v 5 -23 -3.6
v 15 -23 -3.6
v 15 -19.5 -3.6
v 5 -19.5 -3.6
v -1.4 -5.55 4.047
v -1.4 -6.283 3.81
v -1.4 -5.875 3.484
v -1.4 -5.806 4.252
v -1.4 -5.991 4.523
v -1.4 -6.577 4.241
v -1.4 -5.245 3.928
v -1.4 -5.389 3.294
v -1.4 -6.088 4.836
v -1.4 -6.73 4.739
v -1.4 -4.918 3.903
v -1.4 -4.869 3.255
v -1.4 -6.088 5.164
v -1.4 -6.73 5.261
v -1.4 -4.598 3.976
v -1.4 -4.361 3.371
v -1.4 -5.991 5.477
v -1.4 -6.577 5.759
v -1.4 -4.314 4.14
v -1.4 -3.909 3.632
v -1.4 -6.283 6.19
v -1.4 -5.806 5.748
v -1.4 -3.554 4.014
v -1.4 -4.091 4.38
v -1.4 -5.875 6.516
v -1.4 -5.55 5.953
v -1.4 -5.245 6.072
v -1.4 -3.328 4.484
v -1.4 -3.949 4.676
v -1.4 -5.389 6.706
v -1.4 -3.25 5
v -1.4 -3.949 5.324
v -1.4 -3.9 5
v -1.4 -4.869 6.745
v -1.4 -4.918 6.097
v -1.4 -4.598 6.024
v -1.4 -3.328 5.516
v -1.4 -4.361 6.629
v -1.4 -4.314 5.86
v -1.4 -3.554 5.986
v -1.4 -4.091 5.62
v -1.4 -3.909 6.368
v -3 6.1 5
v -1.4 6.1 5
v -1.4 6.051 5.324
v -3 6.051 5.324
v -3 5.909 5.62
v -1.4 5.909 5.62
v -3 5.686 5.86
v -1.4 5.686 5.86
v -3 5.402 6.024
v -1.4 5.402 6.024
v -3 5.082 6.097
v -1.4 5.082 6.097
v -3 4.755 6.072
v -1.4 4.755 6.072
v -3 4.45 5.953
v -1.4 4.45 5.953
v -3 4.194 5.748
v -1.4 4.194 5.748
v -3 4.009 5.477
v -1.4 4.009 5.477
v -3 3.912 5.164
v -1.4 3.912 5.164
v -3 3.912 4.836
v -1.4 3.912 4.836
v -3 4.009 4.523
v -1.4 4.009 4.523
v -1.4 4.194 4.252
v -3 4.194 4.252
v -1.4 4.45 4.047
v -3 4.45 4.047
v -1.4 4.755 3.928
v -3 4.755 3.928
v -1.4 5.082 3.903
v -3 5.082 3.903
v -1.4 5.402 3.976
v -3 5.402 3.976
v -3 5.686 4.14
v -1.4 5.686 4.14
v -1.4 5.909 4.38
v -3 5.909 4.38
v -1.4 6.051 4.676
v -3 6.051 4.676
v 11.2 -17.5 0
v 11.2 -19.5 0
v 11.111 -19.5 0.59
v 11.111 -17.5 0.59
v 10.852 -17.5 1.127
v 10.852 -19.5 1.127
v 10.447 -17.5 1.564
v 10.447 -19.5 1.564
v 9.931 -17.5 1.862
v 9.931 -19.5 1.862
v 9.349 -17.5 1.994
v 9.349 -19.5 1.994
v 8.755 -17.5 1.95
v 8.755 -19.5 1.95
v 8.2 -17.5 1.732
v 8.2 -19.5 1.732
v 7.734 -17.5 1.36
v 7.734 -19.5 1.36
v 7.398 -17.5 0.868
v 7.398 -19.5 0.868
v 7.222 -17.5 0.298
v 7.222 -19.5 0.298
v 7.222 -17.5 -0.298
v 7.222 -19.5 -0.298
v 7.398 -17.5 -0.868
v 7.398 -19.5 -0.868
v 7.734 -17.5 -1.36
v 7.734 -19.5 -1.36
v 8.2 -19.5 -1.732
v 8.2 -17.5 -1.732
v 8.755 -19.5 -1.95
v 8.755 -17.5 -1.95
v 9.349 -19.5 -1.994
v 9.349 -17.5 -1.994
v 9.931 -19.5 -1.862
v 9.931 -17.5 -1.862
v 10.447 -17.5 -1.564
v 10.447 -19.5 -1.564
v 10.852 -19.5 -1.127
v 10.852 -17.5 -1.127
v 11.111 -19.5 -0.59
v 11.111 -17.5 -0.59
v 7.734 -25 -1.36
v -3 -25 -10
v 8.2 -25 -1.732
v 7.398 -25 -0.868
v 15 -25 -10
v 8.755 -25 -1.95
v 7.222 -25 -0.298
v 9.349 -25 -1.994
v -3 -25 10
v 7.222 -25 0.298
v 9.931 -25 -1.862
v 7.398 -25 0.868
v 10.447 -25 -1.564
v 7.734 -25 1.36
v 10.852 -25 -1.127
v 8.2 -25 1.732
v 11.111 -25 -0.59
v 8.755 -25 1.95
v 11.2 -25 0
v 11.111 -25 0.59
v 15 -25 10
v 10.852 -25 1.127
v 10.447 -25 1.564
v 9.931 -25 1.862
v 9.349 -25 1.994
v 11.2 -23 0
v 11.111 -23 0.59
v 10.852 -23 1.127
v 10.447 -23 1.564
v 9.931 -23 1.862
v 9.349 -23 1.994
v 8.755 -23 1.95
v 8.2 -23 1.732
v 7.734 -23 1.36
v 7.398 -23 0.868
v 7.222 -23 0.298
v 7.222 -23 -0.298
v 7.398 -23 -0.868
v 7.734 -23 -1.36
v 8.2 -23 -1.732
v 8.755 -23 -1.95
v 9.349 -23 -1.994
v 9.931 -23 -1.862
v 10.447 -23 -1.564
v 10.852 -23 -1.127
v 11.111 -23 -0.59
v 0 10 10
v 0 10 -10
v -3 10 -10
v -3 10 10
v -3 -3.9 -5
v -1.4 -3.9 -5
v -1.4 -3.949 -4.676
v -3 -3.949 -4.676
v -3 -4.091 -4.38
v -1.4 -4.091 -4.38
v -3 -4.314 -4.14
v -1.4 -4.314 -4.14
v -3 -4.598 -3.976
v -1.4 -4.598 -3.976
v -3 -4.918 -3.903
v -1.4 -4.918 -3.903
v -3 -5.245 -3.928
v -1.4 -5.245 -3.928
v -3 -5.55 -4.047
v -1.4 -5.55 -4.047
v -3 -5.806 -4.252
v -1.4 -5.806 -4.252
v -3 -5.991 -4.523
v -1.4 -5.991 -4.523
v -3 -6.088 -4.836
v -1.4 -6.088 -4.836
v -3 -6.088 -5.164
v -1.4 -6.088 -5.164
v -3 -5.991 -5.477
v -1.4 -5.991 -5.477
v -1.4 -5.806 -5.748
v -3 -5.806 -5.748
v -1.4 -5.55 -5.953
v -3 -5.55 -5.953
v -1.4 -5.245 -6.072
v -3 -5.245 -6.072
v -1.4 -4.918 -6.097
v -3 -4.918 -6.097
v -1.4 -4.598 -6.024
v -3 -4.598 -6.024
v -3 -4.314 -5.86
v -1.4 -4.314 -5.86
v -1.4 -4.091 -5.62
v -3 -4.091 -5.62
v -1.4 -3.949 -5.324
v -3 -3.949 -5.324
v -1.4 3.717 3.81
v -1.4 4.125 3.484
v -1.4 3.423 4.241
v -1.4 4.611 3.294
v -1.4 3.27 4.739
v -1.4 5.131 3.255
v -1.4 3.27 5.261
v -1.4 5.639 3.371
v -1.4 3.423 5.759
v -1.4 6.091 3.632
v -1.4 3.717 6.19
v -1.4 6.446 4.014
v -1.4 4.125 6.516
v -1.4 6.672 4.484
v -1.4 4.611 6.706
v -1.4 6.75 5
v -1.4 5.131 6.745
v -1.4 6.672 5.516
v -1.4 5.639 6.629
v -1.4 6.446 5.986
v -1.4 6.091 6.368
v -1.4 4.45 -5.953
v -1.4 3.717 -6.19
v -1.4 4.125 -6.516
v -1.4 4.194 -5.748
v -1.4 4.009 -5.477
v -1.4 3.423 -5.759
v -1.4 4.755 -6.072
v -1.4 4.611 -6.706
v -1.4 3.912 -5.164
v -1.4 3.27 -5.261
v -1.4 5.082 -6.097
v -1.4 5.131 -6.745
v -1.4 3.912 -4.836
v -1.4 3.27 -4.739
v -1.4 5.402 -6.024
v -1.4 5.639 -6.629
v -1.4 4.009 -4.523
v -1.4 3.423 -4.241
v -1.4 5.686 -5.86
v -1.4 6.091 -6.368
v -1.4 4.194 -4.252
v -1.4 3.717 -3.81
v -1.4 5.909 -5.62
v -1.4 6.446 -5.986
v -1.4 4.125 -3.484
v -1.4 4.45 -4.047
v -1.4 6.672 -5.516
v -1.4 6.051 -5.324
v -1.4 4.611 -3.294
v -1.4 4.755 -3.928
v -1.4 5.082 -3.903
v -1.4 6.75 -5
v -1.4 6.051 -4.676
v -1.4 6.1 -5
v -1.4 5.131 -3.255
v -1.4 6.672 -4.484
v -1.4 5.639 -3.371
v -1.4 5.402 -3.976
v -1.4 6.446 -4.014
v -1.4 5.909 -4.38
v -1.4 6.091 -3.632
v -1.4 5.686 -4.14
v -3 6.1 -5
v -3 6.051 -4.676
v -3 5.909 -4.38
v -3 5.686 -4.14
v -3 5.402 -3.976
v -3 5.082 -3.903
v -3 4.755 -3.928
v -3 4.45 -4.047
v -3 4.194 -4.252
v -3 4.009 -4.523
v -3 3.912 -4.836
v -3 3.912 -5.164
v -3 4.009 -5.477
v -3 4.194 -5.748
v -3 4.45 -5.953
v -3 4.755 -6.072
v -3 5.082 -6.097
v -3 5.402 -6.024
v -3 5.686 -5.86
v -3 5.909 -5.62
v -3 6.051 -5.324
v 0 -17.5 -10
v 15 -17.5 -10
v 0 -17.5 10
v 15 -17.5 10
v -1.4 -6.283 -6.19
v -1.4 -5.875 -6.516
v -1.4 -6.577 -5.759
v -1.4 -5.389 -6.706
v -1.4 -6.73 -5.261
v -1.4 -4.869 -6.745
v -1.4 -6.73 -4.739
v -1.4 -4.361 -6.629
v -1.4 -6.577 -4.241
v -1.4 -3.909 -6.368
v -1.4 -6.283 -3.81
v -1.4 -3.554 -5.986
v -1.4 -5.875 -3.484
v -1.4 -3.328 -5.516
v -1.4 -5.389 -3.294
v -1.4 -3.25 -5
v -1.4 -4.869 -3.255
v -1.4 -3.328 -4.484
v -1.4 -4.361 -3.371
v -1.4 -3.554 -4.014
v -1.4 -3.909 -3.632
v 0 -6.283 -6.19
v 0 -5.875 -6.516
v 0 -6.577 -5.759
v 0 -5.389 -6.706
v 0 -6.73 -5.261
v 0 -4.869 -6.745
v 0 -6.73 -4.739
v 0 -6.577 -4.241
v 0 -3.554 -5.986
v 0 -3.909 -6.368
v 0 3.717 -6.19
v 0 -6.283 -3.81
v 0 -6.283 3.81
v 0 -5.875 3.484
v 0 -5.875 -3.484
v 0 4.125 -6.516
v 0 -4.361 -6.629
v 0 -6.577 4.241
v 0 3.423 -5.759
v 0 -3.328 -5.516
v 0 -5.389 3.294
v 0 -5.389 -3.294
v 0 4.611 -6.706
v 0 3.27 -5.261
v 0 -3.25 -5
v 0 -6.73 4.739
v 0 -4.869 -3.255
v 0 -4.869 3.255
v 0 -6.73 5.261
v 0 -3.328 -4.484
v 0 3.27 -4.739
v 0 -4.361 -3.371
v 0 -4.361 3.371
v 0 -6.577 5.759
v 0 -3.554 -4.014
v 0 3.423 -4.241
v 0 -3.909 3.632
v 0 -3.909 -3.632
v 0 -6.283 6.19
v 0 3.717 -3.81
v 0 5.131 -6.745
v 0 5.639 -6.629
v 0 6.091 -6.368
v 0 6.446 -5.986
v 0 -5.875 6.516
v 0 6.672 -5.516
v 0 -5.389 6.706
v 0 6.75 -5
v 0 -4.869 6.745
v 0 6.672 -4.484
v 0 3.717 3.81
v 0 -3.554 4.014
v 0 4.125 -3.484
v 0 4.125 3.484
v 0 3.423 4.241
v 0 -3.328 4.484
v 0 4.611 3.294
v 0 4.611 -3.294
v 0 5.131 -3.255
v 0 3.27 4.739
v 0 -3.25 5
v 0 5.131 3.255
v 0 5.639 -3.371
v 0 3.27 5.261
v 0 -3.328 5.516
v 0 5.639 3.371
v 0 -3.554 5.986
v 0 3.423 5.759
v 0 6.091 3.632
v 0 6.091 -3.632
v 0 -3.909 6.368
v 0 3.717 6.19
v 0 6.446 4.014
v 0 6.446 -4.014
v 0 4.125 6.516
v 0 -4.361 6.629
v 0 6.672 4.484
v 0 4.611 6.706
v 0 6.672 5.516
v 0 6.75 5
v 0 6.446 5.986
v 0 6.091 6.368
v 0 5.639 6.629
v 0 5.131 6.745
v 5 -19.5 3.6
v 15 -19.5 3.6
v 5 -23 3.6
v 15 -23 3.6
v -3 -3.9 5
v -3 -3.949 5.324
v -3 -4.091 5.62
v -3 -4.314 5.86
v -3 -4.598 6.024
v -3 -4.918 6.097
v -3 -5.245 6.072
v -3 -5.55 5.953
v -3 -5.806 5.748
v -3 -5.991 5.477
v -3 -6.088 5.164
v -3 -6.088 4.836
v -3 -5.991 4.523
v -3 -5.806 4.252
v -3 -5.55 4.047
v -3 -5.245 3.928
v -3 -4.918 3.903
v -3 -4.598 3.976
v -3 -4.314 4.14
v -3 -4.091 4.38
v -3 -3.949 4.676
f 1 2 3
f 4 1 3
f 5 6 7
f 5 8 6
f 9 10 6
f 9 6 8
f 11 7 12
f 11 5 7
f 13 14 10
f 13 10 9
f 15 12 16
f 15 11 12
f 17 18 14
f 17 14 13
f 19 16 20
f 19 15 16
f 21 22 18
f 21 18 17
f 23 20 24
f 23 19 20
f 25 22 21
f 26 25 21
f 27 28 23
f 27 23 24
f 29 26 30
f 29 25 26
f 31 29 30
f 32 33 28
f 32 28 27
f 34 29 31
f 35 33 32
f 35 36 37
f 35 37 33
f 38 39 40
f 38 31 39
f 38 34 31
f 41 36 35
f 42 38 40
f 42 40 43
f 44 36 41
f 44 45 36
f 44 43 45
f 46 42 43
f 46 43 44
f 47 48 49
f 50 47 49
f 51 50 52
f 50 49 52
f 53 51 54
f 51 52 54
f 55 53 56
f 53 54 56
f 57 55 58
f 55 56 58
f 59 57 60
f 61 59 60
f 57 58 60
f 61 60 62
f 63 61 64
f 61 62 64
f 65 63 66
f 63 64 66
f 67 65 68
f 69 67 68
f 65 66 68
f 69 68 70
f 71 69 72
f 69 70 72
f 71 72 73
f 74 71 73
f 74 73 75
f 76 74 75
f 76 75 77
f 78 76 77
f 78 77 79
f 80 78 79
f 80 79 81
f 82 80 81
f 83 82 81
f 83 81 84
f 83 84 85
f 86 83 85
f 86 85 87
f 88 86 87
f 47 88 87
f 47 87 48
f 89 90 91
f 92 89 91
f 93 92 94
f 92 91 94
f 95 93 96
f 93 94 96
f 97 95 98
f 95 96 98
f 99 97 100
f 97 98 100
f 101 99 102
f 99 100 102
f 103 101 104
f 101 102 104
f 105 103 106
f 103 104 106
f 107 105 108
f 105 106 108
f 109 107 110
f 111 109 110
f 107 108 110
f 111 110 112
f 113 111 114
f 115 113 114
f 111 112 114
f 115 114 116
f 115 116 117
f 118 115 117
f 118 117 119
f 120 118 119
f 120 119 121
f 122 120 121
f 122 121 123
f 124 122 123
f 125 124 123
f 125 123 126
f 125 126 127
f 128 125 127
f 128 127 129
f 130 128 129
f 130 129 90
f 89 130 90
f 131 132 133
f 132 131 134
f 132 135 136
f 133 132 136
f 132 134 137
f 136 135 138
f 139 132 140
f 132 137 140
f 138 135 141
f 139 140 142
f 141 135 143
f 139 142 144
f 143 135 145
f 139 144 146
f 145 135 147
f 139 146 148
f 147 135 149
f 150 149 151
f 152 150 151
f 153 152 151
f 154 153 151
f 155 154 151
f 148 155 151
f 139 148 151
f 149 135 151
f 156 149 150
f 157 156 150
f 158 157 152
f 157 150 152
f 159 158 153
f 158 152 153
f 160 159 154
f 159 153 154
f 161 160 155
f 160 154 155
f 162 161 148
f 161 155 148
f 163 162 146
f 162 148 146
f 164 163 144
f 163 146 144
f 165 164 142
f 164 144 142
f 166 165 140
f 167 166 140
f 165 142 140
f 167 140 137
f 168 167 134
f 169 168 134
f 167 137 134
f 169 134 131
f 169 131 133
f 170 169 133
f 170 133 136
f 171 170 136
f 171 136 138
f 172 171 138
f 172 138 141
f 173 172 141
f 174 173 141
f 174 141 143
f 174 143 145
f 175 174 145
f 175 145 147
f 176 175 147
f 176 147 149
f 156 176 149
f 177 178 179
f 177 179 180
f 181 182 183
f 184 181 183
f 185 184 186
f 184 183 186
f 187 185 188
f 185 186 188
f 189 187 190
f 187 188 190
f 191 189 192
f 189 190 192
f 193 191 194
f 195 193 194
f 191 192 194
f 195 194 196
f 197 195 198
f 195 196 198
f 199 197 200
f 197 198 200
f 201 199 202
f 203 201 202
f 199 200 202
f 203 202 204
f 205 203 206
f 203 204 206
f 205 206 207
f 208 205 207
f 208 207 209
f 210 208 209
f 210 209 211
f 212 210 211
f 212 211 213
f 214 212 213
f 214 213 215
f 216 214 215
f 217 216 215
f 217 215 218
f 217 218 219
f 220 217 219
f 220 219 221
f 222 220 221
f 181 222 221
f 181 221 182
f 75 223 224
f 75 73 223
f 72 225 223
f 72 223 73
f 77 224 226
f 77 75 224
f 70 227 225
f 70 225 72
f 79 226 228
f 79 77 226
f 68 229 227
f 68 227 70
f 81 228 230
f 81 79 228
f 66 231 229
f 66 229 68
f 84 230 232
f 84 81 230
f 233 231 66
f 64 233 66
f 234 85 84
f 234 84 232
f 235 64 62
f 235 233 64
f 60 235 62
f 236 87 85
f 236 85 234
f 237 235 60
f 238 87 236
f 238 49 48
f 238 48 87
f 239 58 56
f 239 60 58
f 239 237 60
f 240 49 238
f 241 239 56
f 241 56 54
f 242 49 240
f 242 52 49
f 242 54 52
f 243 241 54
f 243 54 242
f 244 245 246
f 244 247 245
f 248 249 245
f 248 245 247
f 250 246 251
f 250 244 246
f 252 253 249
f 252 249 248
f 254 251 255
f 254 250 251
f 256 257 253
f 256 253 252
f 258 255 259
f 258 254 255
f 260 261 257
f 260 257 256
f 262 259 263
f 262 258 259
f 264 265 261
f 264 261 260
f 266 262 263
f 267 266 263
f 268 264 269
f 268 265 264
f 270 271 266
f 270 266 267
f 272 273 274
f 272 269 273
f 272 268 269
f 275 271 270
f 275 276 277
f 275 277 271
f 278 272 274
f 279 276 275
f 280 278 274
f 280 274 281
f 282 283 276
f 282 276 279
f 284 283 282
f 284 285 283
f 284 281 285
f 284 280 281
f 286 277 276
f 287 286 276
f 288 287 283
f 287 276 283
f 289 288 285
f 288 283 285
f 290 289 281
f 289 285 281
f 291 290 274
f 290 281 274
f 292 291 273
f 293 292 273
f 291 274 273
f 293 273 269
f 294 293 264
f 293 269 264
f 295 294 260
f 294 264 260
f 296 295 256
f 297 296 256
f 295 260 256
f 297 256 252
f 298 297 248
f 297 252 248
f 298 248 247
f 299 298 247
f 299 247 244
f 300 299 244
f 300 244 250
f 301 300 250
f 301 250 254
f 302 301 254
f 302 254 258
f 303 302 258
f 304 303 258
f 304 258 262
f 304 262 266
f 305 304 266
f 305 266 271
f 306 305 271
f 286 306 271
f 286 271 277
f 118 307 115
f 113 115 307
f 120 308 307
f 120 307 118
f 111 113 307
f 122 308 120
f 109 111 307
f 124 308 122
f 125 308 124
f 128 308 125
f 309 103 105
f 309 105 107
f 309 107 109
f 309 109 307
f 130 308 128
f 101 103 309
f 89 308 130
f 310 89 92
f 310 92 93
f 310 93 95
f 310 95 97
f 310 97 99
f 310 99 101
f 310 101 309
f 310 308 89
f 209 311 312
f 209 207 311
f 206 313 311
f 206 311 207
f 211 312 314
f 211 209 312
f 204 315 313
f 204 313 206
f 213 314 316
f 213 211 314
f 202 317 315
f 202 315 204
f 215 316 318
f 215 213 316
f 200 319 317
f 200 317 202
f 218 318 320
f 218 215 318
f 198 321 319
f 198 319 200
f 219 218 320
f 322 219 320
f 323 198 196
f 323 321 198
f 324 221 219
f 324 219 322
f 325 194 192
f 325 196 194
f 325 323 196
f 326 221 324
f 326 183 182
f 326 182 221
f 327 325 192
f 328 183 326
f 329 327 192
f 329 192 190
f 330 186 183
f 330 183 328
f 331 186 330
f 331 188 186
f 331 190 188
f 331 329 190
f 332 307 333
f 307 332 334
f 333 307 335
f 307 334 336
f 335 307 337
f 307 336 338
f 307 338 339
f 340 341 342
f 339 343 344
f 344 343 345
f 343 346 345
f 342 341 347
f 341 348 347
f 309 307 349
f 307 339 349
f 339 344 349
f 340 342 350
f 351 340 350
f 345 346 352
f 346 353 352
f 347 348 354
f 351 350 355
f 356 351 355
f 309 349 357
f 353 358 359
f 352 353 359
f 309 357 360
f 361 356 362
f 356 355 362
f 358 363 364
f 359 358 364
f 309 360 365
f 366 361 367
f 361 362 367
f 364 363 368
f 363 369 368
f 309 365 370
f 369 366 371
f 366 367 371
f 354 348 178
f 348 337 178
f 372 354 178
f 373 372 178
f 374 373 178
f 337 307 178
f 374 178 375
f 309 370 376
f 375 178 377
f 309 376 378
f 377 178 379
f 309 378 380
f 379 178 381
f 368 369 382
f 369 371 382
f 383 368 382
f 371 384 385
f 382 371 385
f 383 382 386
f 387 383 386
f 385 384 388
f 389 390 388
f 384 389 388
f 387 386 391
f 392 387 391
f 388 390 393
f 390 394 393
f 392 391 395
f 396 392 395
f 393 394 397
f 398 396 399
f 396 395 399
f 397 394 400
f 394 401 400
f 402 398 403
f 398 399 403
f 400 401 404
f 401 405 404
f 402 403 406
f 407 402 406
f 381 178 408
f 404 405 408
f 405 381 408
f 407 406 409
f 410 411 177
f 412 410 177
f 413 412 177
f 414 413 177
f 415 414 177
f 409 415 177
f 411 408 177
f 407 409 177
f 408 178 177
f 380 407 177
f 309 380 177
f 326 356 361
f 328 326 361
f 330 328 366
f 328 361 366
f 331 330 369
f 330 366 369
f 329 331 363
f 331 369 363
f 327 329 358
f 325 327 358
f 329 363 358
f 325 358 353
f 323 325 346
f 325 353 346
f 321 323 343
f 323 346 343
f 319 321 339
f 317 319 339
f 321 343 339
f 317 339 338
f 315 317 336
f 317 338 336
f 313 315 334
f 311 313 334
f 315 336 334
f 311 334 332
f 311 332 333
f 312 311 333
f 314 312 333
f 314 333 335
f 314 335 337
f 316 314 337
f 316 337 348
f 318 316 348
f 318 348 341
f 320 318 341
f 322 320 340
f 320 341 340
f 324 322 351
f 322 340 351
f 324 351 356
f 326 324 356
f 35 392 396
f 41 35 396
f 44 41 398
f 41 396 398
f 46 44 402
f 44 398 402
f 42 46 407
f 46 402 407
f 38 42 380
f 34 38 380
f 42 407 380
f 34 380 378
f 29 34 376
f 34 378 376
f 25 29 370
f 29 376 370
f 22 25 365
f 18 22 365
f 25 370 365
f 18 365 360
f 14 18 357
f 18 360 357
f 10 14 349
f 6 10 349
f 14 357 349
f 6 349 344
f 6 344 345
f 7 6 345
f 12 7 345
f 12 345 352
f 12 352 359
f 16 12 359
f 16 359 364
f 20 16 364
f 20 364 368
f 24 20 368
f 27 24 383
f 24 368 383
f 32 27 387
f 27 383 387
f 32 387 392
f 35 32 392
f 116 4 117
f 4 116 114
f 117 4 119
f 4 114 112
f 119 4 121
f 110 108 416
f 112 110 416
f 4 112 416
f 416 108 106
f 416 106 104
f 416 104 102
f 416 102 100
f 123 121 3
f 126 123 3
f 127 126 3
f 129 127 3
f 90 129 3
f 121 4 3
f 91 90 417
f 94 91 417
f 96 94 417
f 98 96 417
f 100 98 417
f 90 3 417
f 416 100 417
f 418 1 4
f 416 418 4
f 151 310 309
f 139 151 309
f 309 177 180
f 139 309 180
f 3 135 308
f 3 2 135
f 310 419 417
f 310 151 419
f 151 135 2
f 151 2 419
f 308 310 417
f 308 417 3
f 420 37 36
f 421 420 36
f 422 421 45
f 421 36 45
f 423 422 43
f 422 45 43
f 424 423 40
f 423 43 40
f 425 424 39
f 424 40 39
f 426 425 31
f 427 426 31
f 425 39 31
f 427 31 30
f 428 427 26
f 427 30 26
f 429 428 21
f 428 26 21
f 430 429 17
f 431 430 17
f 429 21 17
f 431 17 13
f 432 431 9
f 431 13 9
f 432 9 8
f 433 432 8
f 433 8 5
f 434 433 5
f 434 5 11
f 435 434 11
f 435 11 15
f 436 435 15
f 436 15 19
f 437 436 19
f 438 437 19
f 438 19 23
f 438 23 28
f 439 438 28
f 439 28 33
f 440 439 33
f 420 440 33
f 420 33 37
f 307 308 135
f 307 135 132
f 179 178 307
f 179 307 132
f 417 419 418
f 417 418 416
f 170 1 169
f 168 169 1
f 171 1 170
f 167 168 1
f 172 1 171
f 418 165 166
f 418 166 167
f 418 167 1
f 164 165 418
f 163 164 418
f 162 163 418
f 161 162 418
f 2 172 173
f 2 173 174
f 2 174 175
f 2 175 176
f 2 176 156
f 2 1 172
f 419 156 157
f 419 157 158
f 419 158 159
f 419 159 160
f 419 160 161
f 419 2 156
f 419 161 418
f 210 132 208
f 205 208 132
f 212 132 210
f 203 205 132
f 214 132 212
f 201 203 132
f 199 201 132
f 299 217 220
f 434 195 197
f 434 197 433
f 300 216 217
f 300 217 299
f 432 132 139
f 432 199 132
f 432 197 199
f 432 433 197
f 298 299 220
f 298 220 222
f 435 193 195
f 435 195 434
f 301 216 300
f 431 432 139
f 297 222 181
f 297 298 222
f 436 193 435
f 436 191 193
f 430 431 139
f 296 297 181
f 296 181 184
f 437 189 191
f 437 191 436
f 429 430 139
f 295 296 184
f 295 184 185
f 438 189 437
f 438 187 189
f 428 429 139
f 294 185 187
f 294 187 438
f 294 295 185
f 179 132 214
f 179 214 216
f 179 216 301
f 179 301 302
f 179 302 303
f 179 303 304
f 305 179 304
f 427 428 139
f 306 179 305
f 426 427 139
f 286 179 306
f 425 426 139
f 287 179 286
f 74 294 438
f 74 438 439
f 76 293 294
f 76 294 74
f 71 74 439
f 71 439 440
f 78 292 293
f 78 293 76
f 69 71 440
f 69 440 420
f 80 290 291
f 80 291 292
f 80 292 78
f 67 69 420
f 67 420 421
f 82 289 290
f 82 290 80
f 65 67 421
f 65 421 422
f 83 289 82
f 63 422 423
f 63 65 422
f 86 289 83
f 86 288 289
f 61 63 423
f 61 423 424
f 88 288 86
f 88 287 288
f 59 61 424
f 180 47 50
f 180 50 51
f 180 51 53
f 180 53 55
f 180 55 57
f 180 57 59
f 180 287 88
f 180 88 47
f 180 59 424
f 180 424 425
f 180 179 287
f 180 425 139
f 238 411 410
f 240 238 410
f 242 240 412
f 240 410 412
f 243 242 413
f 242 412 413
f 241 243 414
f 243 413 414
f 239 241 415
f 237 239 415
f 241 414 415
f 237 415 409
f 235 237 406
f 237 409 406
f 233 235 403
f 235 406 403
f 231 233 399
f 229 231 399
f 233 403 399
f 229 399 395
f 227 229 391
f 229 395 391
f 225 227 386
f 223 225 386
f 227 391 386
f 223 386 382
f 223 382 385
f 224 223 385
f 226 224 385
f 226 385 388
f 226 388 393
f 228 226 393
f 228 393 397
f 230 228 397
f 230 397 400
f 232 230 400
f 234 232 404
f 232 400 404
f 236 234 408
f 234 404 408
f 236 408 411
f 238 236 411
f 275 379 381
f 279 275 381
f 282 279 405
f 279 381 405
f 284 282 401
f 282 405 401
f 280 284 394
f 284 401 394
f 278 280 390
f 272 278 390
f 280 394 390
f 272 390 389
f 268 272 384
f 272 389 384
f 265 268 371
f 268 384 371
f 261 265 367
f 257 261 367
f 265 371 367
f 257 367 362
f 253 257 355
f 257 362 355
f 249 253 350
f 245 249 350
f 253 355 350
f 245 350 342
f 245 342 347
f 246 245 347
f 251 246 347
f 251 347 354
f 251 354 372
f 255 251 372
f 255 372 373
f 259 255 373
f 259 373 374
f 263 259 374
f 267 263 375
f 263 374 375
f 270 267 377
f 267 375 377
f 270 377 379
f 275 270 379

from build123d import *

# Parameters (mm, degrees)
F0_W     = 20
F0_H     = 20
F0_R     = 1.75
F0_R_2   = 1.1
F1_DEPTH = 3
F2_DEPTH = 1.4
F0_W_2   = 7.5
F3_DEPTH = 15
F4_DEPTH = 3
F5_W     = 3.5
F5_H     = 7.2
F6_DEPTH = 10
F7_R     = 2
F8_DEPTH = 25
F9_DEPTH = 7.5


with BuildPart() as f1:
    # F0 (on Right) → F1 (new body)
    with BuildSketch(Plane.YZ):
        Rectangle(F0_W, F0_H)
        with Locations((-5, -5)):
            Circle(F0_R, mode=Mode.SUBTRACT)
        with Locations((5, -5)):
            Circle(F0_R, mode=Mode.SUBTRACT)
        with Locations((-5, 5)):
            Circle(F0_R, mode=Mode.SUBTRACT)
        with Locations((5, 5)):
            Circle(F0_R, mode=Mode.SUBTRACT)
        with Locations((-5, 5)):
            Circle(F0_R)
        with Locations((-5, 5)):
            Circle(F0_R_2, mode=Mode.SUBTRACT)
        with Locations((5, 5)):
            Circle(F0_R)
        with Locations((5, 5)):
            Circle(F0_R_2, mode=Mode.SUBTRACT)
        with Locations((5, -5)):
            Circle(F0_R)
        with Locations((5, -5)):
            Circle(F0_R_2, mode=Mode.SUBTRACT)
        with Locations((-5, -5)):
            Circle(F0_R)
        with Locations((-5, -5)):
            Circle(F0_R_2, mode=Mode.SUBTRACT)
    extrude(amount=-F1_DEPTH)

    # F0 (on Right) → F2 (cut)
    with BuildSketch(Plane.YZ):
        with Locations((-5, 5)):
            Circle(F0_R)
        with Locations((-5, 5)):
            Circle(F0_R_2, mode=Mode.SUBTRACT)
        with Locations((5, 5)):
            Circle(F0_R)
        with Locations((5, 5)):
            Circle(F0_R_2, mode=Mode.SUBTRACT)
        with Locations((5, -5)):
            Circle(F0_R)
        with Locations((5, -5)):
            Circle(F0_R_2, mode=Mode.SUBTRACT)
        with Locations((-5, -5)):
            Circle(F0_R)
        with Locations((-5, -5)):
            Circle(F0_R_2, mode=Mode.SUBTRACT)
    extrude(amount=-F2_DEPTH, mode=Mode.SUBTRACT)

    # F9 (add, through all): a face of the model
    f9_faces = [f1.faces().sort_by_distance(p)[0] for p in [
        (-1.5, -10, 0),
    ]]


with BuildPart() as f3:
    # F0 (on Right) → F3 (new body)
    with BuildSketch(Plane.YZ):
        with Locations((-21.25, 0)):
            Rectangle(F0_W_2, F0_H)
    extrude(amount=F3_DEPTH)

    # F4 (add, through all): a face of the model
    f4_faces = [f3.faces().sort_by_distance(p)[0] for p in [
        (0, -21.25, 0),
    ]]
    extrude(f4_faces, amount=F4_DEPTH)

    # F5 (on face) → F6 (cut)
    with BuildSketch(Plane.YZ.offset(15)):
        with Locations((-21.25, 0)):
            Rectangle(F5_W, F5_H)
    extrude(amount=-F6_DEPTH, mode=Mode.SUBTRACT)

    # F7 (on face) → F8 (cut)
    with BuildSketch(Plane.XZ.offset(25)):
        with Locations((9.2, 0)):
            Circle(F7_R)
    extrude(amount=-F8_DEPTH, mode=Mode.SUBTRACT)


with BuildPart() as f1_1:
    add(f1.part)

    add(f3.part)  # F9 merges F3
    extrude(f9_faces, amount=F9_DEPTH)


solid = f1_1.part
